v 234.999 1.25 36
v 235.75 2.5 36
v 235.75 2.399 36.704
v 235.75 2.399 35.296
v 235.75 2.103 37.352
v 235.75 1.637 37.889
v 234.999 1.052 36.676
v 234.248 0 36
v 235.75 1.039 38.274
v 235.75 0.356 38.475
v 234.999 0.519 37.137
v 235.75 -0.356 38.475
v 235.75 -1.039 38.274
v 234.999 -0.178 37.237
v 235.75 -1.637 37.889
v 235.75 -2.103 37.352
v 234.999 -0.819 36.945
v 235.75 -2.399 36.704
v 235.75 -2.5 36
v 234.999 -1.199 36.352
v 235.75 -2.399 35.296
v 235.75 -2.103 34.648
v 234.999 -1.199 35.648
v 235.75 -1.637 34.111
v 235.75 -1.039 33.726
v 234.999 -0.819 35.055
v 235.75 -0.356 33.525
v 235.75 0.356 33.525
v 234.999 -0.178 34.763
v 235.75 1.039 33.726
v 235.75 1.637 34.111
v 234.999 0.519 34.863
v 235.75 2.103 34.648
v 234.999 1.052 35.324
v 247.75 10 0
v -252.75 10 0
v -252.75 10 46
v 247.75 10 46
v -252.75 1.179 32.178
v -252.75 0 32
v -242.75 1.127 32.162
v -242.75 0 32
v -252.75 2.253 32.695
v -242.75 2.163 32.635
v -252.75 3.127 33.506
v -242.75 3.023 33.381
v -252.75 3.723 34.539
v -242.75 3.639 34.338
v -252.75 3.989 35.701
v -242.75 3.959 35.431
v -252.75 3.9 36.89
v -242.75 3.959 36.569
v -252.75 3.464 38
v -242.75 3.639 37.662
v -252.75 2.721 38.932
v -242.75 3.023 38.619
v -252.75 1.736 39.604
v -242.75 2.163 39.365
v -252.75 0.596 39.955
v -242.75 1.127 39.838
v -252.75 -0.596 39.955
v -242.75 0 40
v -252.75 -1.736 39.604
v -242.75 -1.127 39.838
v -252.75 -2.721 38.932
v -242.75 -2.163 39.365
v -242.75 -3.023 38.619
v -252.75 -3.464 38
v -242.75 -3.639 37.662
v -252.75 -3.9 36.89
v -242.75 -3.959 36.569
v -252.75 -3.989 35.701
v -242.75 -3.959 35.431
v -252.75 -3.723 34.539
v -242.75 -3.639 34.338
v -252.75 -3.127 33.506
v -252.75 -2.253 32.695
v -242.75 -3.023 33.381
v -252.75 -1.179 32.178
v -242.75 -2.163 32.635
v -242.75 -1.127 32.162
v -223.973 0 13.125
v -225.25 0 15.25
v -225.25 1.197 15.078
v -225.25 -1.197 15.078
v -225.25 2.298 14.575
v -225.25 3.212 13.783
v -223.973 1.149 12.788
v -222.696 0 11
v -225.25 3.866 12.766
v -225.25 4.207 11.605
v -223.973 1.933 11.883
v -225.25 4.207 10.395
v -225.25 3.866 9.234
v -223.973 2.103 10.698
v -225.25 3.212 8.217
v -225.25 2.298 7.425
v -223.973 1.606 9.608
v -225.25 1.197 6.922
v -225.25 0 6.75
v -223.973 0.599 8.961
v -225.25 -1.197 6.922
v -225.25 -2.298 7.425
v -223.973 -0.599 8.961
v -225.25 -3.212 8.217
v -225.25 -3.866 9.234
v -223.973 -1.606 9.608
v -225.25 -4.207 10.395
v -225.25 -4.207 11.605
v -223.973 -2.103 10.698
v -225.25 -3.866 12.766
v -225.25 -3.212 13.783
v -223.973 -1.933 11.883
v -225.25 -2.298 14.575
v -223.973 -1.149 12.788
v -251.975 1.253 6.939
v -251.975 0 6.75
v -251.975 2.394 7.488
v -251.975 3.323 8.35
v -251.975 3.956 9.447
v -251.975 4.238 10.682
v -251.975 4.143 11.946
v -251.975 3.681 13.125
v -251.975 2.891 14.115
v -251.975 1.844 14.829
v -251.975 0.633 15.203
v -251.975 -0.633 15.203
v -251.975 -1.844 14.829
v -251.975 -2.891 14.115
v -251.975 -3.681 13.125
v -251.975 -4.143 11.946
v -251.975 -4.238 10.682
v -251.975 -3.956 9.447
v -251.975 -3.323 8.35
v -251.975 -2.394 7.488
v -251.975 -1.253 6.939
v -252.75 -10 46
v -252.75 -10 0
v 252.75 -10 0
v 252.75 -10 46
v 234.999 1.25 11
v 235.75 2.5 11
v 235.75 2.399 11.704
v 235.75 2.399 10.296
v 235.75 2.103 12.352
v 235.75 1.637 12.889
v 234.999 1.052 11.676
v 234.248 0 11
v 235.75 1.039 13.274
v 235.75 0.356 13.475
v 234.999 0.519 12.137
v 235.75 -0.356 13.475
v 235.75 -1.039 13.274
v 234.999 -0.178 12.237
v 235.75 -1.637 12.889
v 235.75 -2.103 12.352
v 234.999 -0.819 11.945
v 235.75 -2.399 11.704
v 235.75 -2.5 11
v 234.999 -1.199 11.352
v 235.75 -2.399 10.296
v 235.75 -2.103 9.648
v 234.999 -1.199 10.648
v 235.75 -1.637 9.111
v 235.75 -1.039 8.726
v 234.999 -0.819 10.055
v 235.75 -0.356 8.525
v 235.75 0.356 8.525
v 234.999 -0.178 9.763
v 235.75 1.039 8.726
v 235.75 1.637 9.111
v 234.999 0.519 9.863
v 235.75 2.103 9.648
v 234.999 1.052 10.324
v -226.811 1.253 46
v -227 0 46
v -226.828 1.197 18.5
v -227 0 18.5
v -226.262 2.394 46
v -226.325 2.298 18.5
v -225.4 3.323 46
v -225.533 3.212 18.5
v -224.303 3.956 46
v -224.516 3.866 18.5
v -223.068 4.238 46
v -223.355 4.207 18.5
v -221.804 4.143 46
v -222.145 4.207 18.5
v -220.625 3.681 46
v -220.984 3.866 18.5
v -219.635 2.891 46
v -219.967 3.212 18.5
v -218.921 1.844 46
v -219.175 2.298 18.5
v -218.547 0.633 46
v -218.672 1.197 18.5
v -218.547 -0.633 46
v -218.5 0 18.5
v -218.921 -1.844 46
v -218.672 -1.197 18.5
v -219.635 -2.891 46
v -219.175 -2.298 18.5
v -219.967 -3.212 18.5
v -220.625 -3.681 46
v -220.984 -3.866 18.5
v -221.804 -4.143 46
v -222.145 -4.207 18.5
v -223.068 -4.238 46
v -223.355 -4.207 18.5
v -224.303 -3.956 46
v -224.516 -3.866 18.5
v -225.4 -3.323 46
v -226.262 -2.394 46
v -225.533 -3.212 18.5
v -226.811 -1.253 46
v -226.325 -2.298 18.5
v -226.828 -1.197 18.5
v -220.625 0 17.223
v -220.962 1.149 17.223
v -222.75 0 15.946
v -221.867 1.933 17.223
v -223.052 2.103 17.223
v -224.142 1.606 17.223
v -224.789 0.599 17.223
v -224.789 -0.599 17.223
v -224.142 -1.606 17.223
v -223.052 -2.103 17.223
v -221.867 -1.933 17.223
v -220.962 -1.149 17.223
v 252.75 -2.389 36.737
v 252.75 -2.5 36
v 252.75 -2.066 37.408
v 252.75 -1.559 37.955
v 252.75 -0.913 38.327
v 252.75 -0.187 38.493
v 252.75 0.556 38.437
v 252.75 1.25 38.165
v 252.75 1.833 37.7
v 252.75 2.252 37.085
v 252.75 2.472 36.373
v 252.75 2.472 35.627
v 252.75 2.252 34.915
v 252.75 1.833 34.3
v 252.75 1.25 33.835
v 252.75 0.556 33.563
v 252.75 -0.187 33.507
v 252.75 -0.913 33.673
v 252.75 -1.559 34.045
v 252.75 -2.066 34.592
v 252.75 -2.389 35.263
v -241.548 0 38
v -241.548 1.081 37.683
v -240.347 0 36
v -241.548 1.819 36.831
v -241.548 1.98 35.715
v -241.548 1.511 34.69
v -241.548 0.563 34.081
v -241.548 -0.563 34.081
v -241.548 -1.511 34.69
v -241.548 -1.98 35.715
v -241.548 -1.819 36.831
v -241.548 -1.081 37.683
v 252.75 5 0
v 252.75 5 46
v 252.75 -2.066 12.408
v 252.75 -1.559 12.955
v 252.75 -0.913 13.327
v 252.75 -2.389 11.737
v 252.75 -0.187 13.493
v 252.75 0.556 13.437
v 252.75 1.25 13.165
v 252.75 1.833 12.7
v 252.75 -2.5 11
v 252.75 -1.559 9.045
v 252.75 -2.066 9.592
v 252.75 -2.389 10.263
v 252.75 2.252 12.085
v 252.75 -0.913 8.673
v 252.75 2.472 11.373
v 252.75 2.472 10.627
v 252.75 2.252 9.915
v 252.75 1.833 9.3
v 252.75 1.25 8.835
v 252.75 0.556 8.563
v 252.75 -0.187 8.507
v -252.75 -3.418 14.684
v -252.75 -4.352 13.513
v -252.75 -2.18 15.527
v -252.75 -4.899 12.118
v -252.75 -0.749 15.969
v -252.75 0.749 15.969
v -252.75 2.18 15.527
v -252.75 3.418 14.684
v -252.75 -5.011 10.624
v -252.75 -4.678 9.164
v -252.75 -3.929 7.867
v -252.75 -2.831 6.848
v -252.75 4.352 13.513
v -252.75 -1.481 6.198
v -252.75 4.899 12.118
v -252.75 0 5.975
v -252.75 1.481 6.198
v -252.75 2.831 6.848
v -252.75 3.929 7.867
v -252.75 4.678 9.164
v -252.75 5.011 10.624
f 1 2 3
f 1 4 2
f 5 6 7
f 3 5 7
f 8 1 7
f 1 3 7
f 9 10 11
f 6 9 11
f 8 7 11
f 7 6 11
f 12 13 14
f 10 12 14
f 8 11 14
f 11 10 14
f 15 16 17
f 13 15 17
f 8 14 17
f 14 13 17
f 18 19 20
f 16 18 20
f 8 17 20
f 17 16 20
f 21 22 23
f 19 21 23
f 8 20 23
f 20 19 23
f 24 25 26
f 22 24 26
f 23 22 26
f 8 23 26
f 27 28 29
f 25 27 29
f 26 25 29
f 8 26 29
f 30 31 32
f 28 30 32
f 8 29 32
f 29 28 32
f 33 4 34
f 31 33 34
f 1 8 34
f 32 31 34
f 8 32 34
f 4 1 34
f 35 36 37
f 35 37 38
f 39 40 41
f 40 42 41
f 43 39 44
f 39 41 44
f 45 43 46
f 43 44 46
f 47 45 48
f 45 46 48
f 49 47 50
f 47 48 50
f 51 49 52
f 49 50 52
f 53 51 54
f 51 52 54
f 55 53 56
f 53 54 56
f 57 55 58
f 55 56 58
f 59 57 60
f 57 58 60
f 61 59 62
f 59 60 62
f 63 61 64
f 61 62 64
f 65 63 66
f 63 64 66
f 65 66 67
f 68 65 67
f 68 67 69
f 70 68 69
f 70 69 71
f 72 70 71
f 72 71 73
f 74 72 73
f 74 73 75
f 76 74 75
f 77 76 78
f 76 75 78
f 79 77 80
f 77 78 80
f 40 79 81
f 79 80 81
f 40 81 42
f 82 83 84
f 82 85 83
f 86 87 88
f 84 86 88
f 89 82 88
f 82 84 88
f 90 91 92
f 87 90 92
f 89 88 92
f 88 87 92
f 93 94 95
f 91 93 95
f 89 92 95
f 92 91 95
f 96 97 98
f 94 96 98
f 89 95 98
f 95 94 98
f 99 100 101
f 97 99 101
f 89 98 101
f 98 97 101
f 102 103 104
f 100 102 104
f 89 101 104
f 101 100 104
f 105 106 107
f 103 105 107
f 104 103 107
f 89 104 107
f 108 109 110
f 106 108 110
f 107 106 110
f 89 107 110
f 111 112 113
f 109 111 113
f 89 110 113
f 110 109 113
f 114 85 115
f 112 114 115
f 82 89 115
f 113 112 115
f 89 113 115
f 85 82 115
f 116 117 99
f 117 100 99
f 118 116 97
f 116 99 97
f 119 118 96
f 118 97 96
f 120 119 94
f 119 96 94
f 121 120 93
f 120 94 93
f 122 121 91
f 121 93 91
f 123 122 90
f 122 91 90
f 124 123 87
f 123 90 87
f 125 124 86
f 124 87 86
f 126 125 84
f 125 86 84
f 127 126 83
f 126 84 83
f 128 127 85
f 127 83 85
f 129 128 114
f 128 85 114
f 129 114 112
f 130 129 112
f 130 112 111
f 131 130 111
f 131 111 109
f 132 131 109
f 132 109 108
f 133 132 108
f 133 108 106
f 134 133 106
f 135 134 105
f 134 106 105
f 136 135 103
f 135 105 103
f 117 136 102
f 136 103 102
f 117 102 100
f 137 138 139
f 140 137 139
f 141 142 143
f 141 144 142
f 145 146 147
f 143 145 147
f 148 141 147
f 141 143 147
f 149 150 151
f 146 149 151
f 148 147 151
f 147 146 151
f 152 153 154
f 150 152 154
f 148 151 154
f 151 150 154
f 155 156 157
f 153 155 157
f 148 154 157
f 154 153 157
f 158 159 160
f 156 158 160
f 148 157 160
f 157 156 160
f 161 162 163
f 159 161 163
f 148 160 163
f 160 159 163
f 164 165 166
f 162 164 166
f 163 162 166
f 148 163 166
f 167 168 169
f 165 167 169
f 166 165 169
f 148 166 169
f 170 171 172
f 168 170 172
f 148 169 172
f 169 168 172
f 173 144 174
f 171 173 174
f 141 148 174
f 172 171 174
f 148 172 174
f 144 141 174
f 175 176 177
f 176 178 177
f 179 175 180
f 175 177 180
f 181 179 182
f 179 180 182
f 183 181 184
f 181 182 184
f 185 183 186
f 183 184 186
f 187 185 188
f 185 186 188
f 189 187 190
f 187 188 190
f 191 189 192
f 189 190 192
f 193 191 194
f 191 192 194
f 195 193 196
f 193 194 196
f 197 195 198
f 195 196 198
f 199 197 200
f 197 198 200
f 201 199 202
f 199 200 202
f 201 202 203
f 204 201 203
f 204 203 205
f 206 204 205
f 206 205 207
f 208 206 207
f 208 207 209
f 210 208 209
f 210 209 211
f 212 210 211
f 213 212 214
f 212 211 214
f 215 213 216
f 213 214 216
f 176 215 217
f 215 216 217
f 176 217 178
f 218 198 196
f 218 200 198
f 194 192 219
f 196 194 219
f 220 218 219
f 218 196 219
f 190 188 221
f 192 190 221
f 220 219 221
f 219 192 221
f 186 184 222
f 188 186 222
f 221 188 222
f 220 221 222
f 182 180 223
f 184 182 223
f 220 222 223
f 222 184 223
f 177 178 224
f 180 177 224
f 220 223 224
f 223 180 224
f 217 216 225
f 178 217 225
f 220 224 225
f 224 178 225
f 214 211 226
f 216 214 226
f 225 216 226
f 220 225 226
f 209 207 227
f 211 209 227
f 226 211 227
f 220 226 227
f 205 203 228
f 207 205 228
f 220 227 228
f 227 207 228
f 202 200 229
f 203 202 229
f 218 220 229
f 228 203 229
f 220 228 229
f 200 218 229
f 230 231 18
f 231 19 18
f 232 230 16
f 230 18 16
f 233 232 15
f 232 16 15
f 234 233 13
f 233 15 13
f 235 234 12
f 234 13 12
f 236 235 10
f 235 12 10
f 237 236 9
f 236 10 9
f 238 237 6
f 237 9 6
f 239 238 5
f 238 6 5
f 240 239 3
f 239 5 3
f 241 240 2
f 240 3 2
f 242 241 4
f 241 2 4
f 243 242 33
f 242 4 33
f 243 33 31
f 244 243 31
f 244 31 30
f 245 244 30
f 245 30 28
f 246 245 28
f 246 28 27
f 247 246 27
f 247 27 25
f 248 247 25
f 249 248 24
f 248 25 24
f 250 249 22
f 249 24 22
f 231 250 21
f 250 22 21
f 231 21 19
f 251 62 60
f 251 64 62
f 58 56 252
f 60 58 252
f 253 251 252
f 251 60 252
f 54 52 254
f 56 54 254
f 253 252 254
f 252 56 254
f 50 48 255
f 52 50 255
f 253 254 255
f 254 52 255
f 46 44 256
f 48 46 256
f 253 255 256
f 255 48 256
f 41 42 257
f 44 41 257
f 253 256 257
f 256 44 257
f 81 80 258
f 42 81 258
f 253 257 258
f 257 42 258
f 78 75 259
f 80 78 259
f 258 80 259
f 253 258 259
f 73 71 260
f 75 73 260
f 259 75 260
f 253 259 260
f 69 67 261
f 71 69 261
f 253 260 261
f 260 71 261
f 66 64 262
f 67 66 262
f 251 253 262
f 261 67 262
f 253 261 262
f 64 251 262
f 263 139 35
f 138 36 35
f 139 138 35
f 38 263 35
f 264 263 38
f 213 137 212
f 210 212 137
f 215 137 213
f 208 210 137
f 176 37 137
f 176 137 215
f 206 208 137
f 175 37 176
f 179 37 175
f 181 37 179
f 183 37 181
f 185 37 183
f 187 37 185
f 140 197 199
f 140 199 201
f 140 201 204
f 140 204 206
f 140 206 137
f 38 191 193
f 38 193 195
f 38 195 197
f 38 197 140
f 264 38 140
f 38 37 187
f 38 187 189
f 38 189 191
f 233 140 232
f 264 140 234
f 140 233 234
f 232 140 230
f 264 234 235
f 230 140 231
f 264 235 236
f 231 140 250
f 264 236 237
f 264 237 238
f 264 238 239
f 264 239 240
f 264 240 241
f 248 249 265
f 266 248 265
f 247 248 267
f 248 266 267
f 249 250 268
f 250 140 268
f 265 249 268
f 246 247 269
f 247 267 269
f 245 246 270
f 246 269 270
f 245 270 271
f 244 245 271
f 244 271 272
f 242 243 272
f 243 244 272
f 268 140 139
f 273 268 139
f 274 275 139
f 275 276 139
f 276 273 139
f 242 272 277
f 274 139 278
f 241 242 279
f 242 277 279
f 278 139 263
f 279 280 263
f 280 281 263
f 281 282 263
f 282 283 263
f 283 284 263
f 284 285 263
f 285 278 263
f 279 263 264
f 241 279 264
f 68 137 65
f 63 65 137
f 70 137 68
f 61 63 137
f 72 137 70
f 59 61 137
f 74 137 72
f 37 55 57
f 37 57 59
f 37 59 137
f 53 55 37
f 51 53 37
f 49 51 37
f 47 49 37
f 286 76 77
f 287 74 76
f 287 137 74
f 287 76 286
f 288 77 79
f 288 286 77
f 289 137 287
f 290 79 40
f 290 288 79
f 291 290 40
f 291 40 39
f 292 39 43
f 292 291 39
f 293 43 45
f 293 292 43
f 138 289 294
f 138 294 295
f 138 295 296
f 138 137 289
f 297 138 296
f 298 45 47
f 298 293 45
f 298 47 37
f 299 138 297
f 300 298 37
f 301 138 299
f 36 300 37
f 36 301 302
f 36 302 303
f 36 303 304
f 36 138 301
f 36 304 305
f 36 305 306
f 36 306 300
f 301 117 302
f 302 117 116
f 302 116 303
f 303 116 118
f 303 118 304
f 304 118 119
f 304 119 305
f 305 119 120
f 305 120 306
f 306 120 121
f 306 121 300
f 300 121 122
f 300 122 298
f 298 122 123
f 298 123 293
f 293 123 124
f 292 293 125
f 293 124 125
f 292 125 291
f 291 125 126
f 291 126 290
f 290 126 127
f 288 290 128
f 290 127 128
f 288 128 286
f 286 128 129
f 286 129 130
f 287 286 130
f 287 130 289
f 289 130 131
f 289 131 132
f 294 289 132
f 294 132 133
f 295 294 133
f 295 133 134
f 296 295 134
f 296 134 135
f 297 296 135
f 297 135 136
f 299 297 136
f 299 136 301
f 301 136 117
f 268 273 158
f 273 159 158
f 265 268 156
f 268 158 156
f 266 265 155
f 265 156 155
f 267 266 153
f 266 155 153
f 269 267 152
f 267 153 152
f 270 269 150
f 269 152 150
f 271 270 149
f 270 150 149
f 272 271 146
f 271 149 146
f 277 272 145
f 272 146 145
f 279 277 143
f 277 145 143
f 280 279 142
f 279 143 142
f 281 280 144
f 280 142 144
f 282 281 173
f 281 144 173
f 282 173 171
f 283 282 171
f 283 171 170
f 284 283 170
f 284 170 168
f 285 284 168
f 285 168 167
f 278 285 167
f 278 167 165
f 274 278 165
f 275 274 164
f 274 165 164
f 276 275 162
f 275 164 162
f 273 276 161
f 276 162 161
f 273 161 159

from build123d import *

# Parameters (mm, degrees)
SKIZZE1_W                          = 505.5
SKIZZE1_H                          = 20
LINEAR_AUSTRAGEN1_DEPTH            = 46
M10_GEWINDEBOHRUNG1_D              = 8.5
M10_GEWINDEBOHRUNG1_DEPTH          = 27.5
M10_GEWINDEBOHRUNG1_CSINK_D        = 10.05
M10_GEWINDEBOHRUNG1_CSINK_ANGLE    = 90
M10_GEWINDEBOHRUNG1_TIP            = 2.553657631
F_8_0_8_DURCHMESSER_BOHRUNG1_D     = 8
F_8_0_8_DURCHMESSER_BOHRUNG1_DEPTH = 10
F_8_0_8_DURCHMESSER_BOHRUNG1_TIP   = 2.403442476
M10_GEWINDEBOHRUNG2_D              = 8.5
M10_GEWINDEBOHRUNG2_DEPTH          = 27.5
M10_GEWINDEBOHRUNG2_TIP            = 2.553657631
M6_GEWINDEBOHRUNG1_D               = 5
M6_GEWINDEBOHRUNG1_DEPTH           = 17
M6_GEWINDEBOHRUNG1_TIP             = 1.502151548
FASE1_SIZE                         = 5


with BuildPart() as part:
    # Skizze1 → Linear austragen1 (new body)
    with BuildSketch(Plane.XY):
        Rectangle(SKIZZE1_W, SKIZZE1_H)
    extrude(amount=LINEAR_AUSTRAGEN1_DEPTH)

    # M10 Gewindebohrung1
    with Locations(Plane.ZY.offset(252.75)):
        with Locations((11, 0)):
            CounterSinkHole(M10_GEWINDEBOHRUNG1_D / 2, M10_GEWINDEBOHRUNG1_CSINK_D / 2, depth=M10_GEWINDEBOHRUNG1_DEPTH, counter_sink_angle=M10_GEWINDEBOHRUNG1_CSINK_ANGLE)
            with Locations((0, 0, -(M10_GEWINDEBOHRUNG1_DEPTH + M10_GEWINDEBOHRUNG1_TIP / 2))):  # 118° drill point
                Cone(0, M10_GEWINDEBOHRUNG1_D / 2, M10_GEWINDEBOHRUNG1_TIP, mode=Mode.SUBTRACT)

    # Ø8.0 (8) Durchmesser Bohrung1
    with Locations(Plane.ZY.offset(252.75)):
        with Locations((36, 0)):
            Hole(F_8_0_8_DURCHMESSER_BOHRUNG1_D / 2, depth=F_8_0_8_DURCHMESSER_BOHRUNG1_DEPTH)
            with Locations((0, 0, -(F_8_0_8_DURCHMESSER_BOHRUNG1_DEPTH + F_8_0_8_DURCHMESSER_BOHRUNG1_TIP / 2))):  # 118° drill point
                Cone(0, F_8_0_8_DURCHMESSER_BOHRUNG1_D / 2, F_8_0_8_DURCHMESSER_BOHRUNG1_TIP, mode=Mode.SUBTRACT)

    # M10 Gewindebohrung2
    with Locations(Plane.XY.offset(46)):
        with Locations((-222.75, 0)):
            Hole(M10_GEWINDEBOHRUNG2_D / 2, depth=M10_GEWINDEBOHRUNG2_DEPTH)
            with Locations((0, 0, -(M10_GEWINDEBOHRUNG2_DEPTH + M10_GEWINDEBOHRUNG2_TIP / 2))):  # 118° drill point
                Cone(0, M10_GEWINDEBOHRUNG2_D / 2, M10_GEWINDEBOHRUNG2_TIP, mode=Mode.SUBTRACT)

    # M6 Gewindebohrung1
    with Locations(Plane(origin=(252.75, -240.771899173, -2.604695508), x_dir=(0, 1, 0), z_dir=(1, 0, 0))):
        with Locations((240.771899173, 13.604695508), (240.771899173, 38.604695508)):
            Hole(M6_GEWINDEBOHRUNG1_D / 2, depth=M6_GEWINDEBOHRUNG1_DEPTH)
            with Locations((0, 0, -(M6_GEWINDEBOHRUNG1_DEPTH + M6_GEWINDEBOHRUNG1_TIP / 2))):  # 118° drill point
                Cone(0, M6_GEWINDEBOHRUNG1_D / 2, M6_GEWINDEBOHRUNG1_TIP, mode=Mode.SUBTRACT)

    # Fase1
    fase1_edges = [part.edges().sort_by_distance(p)[0] for p in [
        (252.75, 10, 23),
    ]]
    chamfer(fase1_edges, length=FASE1_SIZE)


solid = part.part
